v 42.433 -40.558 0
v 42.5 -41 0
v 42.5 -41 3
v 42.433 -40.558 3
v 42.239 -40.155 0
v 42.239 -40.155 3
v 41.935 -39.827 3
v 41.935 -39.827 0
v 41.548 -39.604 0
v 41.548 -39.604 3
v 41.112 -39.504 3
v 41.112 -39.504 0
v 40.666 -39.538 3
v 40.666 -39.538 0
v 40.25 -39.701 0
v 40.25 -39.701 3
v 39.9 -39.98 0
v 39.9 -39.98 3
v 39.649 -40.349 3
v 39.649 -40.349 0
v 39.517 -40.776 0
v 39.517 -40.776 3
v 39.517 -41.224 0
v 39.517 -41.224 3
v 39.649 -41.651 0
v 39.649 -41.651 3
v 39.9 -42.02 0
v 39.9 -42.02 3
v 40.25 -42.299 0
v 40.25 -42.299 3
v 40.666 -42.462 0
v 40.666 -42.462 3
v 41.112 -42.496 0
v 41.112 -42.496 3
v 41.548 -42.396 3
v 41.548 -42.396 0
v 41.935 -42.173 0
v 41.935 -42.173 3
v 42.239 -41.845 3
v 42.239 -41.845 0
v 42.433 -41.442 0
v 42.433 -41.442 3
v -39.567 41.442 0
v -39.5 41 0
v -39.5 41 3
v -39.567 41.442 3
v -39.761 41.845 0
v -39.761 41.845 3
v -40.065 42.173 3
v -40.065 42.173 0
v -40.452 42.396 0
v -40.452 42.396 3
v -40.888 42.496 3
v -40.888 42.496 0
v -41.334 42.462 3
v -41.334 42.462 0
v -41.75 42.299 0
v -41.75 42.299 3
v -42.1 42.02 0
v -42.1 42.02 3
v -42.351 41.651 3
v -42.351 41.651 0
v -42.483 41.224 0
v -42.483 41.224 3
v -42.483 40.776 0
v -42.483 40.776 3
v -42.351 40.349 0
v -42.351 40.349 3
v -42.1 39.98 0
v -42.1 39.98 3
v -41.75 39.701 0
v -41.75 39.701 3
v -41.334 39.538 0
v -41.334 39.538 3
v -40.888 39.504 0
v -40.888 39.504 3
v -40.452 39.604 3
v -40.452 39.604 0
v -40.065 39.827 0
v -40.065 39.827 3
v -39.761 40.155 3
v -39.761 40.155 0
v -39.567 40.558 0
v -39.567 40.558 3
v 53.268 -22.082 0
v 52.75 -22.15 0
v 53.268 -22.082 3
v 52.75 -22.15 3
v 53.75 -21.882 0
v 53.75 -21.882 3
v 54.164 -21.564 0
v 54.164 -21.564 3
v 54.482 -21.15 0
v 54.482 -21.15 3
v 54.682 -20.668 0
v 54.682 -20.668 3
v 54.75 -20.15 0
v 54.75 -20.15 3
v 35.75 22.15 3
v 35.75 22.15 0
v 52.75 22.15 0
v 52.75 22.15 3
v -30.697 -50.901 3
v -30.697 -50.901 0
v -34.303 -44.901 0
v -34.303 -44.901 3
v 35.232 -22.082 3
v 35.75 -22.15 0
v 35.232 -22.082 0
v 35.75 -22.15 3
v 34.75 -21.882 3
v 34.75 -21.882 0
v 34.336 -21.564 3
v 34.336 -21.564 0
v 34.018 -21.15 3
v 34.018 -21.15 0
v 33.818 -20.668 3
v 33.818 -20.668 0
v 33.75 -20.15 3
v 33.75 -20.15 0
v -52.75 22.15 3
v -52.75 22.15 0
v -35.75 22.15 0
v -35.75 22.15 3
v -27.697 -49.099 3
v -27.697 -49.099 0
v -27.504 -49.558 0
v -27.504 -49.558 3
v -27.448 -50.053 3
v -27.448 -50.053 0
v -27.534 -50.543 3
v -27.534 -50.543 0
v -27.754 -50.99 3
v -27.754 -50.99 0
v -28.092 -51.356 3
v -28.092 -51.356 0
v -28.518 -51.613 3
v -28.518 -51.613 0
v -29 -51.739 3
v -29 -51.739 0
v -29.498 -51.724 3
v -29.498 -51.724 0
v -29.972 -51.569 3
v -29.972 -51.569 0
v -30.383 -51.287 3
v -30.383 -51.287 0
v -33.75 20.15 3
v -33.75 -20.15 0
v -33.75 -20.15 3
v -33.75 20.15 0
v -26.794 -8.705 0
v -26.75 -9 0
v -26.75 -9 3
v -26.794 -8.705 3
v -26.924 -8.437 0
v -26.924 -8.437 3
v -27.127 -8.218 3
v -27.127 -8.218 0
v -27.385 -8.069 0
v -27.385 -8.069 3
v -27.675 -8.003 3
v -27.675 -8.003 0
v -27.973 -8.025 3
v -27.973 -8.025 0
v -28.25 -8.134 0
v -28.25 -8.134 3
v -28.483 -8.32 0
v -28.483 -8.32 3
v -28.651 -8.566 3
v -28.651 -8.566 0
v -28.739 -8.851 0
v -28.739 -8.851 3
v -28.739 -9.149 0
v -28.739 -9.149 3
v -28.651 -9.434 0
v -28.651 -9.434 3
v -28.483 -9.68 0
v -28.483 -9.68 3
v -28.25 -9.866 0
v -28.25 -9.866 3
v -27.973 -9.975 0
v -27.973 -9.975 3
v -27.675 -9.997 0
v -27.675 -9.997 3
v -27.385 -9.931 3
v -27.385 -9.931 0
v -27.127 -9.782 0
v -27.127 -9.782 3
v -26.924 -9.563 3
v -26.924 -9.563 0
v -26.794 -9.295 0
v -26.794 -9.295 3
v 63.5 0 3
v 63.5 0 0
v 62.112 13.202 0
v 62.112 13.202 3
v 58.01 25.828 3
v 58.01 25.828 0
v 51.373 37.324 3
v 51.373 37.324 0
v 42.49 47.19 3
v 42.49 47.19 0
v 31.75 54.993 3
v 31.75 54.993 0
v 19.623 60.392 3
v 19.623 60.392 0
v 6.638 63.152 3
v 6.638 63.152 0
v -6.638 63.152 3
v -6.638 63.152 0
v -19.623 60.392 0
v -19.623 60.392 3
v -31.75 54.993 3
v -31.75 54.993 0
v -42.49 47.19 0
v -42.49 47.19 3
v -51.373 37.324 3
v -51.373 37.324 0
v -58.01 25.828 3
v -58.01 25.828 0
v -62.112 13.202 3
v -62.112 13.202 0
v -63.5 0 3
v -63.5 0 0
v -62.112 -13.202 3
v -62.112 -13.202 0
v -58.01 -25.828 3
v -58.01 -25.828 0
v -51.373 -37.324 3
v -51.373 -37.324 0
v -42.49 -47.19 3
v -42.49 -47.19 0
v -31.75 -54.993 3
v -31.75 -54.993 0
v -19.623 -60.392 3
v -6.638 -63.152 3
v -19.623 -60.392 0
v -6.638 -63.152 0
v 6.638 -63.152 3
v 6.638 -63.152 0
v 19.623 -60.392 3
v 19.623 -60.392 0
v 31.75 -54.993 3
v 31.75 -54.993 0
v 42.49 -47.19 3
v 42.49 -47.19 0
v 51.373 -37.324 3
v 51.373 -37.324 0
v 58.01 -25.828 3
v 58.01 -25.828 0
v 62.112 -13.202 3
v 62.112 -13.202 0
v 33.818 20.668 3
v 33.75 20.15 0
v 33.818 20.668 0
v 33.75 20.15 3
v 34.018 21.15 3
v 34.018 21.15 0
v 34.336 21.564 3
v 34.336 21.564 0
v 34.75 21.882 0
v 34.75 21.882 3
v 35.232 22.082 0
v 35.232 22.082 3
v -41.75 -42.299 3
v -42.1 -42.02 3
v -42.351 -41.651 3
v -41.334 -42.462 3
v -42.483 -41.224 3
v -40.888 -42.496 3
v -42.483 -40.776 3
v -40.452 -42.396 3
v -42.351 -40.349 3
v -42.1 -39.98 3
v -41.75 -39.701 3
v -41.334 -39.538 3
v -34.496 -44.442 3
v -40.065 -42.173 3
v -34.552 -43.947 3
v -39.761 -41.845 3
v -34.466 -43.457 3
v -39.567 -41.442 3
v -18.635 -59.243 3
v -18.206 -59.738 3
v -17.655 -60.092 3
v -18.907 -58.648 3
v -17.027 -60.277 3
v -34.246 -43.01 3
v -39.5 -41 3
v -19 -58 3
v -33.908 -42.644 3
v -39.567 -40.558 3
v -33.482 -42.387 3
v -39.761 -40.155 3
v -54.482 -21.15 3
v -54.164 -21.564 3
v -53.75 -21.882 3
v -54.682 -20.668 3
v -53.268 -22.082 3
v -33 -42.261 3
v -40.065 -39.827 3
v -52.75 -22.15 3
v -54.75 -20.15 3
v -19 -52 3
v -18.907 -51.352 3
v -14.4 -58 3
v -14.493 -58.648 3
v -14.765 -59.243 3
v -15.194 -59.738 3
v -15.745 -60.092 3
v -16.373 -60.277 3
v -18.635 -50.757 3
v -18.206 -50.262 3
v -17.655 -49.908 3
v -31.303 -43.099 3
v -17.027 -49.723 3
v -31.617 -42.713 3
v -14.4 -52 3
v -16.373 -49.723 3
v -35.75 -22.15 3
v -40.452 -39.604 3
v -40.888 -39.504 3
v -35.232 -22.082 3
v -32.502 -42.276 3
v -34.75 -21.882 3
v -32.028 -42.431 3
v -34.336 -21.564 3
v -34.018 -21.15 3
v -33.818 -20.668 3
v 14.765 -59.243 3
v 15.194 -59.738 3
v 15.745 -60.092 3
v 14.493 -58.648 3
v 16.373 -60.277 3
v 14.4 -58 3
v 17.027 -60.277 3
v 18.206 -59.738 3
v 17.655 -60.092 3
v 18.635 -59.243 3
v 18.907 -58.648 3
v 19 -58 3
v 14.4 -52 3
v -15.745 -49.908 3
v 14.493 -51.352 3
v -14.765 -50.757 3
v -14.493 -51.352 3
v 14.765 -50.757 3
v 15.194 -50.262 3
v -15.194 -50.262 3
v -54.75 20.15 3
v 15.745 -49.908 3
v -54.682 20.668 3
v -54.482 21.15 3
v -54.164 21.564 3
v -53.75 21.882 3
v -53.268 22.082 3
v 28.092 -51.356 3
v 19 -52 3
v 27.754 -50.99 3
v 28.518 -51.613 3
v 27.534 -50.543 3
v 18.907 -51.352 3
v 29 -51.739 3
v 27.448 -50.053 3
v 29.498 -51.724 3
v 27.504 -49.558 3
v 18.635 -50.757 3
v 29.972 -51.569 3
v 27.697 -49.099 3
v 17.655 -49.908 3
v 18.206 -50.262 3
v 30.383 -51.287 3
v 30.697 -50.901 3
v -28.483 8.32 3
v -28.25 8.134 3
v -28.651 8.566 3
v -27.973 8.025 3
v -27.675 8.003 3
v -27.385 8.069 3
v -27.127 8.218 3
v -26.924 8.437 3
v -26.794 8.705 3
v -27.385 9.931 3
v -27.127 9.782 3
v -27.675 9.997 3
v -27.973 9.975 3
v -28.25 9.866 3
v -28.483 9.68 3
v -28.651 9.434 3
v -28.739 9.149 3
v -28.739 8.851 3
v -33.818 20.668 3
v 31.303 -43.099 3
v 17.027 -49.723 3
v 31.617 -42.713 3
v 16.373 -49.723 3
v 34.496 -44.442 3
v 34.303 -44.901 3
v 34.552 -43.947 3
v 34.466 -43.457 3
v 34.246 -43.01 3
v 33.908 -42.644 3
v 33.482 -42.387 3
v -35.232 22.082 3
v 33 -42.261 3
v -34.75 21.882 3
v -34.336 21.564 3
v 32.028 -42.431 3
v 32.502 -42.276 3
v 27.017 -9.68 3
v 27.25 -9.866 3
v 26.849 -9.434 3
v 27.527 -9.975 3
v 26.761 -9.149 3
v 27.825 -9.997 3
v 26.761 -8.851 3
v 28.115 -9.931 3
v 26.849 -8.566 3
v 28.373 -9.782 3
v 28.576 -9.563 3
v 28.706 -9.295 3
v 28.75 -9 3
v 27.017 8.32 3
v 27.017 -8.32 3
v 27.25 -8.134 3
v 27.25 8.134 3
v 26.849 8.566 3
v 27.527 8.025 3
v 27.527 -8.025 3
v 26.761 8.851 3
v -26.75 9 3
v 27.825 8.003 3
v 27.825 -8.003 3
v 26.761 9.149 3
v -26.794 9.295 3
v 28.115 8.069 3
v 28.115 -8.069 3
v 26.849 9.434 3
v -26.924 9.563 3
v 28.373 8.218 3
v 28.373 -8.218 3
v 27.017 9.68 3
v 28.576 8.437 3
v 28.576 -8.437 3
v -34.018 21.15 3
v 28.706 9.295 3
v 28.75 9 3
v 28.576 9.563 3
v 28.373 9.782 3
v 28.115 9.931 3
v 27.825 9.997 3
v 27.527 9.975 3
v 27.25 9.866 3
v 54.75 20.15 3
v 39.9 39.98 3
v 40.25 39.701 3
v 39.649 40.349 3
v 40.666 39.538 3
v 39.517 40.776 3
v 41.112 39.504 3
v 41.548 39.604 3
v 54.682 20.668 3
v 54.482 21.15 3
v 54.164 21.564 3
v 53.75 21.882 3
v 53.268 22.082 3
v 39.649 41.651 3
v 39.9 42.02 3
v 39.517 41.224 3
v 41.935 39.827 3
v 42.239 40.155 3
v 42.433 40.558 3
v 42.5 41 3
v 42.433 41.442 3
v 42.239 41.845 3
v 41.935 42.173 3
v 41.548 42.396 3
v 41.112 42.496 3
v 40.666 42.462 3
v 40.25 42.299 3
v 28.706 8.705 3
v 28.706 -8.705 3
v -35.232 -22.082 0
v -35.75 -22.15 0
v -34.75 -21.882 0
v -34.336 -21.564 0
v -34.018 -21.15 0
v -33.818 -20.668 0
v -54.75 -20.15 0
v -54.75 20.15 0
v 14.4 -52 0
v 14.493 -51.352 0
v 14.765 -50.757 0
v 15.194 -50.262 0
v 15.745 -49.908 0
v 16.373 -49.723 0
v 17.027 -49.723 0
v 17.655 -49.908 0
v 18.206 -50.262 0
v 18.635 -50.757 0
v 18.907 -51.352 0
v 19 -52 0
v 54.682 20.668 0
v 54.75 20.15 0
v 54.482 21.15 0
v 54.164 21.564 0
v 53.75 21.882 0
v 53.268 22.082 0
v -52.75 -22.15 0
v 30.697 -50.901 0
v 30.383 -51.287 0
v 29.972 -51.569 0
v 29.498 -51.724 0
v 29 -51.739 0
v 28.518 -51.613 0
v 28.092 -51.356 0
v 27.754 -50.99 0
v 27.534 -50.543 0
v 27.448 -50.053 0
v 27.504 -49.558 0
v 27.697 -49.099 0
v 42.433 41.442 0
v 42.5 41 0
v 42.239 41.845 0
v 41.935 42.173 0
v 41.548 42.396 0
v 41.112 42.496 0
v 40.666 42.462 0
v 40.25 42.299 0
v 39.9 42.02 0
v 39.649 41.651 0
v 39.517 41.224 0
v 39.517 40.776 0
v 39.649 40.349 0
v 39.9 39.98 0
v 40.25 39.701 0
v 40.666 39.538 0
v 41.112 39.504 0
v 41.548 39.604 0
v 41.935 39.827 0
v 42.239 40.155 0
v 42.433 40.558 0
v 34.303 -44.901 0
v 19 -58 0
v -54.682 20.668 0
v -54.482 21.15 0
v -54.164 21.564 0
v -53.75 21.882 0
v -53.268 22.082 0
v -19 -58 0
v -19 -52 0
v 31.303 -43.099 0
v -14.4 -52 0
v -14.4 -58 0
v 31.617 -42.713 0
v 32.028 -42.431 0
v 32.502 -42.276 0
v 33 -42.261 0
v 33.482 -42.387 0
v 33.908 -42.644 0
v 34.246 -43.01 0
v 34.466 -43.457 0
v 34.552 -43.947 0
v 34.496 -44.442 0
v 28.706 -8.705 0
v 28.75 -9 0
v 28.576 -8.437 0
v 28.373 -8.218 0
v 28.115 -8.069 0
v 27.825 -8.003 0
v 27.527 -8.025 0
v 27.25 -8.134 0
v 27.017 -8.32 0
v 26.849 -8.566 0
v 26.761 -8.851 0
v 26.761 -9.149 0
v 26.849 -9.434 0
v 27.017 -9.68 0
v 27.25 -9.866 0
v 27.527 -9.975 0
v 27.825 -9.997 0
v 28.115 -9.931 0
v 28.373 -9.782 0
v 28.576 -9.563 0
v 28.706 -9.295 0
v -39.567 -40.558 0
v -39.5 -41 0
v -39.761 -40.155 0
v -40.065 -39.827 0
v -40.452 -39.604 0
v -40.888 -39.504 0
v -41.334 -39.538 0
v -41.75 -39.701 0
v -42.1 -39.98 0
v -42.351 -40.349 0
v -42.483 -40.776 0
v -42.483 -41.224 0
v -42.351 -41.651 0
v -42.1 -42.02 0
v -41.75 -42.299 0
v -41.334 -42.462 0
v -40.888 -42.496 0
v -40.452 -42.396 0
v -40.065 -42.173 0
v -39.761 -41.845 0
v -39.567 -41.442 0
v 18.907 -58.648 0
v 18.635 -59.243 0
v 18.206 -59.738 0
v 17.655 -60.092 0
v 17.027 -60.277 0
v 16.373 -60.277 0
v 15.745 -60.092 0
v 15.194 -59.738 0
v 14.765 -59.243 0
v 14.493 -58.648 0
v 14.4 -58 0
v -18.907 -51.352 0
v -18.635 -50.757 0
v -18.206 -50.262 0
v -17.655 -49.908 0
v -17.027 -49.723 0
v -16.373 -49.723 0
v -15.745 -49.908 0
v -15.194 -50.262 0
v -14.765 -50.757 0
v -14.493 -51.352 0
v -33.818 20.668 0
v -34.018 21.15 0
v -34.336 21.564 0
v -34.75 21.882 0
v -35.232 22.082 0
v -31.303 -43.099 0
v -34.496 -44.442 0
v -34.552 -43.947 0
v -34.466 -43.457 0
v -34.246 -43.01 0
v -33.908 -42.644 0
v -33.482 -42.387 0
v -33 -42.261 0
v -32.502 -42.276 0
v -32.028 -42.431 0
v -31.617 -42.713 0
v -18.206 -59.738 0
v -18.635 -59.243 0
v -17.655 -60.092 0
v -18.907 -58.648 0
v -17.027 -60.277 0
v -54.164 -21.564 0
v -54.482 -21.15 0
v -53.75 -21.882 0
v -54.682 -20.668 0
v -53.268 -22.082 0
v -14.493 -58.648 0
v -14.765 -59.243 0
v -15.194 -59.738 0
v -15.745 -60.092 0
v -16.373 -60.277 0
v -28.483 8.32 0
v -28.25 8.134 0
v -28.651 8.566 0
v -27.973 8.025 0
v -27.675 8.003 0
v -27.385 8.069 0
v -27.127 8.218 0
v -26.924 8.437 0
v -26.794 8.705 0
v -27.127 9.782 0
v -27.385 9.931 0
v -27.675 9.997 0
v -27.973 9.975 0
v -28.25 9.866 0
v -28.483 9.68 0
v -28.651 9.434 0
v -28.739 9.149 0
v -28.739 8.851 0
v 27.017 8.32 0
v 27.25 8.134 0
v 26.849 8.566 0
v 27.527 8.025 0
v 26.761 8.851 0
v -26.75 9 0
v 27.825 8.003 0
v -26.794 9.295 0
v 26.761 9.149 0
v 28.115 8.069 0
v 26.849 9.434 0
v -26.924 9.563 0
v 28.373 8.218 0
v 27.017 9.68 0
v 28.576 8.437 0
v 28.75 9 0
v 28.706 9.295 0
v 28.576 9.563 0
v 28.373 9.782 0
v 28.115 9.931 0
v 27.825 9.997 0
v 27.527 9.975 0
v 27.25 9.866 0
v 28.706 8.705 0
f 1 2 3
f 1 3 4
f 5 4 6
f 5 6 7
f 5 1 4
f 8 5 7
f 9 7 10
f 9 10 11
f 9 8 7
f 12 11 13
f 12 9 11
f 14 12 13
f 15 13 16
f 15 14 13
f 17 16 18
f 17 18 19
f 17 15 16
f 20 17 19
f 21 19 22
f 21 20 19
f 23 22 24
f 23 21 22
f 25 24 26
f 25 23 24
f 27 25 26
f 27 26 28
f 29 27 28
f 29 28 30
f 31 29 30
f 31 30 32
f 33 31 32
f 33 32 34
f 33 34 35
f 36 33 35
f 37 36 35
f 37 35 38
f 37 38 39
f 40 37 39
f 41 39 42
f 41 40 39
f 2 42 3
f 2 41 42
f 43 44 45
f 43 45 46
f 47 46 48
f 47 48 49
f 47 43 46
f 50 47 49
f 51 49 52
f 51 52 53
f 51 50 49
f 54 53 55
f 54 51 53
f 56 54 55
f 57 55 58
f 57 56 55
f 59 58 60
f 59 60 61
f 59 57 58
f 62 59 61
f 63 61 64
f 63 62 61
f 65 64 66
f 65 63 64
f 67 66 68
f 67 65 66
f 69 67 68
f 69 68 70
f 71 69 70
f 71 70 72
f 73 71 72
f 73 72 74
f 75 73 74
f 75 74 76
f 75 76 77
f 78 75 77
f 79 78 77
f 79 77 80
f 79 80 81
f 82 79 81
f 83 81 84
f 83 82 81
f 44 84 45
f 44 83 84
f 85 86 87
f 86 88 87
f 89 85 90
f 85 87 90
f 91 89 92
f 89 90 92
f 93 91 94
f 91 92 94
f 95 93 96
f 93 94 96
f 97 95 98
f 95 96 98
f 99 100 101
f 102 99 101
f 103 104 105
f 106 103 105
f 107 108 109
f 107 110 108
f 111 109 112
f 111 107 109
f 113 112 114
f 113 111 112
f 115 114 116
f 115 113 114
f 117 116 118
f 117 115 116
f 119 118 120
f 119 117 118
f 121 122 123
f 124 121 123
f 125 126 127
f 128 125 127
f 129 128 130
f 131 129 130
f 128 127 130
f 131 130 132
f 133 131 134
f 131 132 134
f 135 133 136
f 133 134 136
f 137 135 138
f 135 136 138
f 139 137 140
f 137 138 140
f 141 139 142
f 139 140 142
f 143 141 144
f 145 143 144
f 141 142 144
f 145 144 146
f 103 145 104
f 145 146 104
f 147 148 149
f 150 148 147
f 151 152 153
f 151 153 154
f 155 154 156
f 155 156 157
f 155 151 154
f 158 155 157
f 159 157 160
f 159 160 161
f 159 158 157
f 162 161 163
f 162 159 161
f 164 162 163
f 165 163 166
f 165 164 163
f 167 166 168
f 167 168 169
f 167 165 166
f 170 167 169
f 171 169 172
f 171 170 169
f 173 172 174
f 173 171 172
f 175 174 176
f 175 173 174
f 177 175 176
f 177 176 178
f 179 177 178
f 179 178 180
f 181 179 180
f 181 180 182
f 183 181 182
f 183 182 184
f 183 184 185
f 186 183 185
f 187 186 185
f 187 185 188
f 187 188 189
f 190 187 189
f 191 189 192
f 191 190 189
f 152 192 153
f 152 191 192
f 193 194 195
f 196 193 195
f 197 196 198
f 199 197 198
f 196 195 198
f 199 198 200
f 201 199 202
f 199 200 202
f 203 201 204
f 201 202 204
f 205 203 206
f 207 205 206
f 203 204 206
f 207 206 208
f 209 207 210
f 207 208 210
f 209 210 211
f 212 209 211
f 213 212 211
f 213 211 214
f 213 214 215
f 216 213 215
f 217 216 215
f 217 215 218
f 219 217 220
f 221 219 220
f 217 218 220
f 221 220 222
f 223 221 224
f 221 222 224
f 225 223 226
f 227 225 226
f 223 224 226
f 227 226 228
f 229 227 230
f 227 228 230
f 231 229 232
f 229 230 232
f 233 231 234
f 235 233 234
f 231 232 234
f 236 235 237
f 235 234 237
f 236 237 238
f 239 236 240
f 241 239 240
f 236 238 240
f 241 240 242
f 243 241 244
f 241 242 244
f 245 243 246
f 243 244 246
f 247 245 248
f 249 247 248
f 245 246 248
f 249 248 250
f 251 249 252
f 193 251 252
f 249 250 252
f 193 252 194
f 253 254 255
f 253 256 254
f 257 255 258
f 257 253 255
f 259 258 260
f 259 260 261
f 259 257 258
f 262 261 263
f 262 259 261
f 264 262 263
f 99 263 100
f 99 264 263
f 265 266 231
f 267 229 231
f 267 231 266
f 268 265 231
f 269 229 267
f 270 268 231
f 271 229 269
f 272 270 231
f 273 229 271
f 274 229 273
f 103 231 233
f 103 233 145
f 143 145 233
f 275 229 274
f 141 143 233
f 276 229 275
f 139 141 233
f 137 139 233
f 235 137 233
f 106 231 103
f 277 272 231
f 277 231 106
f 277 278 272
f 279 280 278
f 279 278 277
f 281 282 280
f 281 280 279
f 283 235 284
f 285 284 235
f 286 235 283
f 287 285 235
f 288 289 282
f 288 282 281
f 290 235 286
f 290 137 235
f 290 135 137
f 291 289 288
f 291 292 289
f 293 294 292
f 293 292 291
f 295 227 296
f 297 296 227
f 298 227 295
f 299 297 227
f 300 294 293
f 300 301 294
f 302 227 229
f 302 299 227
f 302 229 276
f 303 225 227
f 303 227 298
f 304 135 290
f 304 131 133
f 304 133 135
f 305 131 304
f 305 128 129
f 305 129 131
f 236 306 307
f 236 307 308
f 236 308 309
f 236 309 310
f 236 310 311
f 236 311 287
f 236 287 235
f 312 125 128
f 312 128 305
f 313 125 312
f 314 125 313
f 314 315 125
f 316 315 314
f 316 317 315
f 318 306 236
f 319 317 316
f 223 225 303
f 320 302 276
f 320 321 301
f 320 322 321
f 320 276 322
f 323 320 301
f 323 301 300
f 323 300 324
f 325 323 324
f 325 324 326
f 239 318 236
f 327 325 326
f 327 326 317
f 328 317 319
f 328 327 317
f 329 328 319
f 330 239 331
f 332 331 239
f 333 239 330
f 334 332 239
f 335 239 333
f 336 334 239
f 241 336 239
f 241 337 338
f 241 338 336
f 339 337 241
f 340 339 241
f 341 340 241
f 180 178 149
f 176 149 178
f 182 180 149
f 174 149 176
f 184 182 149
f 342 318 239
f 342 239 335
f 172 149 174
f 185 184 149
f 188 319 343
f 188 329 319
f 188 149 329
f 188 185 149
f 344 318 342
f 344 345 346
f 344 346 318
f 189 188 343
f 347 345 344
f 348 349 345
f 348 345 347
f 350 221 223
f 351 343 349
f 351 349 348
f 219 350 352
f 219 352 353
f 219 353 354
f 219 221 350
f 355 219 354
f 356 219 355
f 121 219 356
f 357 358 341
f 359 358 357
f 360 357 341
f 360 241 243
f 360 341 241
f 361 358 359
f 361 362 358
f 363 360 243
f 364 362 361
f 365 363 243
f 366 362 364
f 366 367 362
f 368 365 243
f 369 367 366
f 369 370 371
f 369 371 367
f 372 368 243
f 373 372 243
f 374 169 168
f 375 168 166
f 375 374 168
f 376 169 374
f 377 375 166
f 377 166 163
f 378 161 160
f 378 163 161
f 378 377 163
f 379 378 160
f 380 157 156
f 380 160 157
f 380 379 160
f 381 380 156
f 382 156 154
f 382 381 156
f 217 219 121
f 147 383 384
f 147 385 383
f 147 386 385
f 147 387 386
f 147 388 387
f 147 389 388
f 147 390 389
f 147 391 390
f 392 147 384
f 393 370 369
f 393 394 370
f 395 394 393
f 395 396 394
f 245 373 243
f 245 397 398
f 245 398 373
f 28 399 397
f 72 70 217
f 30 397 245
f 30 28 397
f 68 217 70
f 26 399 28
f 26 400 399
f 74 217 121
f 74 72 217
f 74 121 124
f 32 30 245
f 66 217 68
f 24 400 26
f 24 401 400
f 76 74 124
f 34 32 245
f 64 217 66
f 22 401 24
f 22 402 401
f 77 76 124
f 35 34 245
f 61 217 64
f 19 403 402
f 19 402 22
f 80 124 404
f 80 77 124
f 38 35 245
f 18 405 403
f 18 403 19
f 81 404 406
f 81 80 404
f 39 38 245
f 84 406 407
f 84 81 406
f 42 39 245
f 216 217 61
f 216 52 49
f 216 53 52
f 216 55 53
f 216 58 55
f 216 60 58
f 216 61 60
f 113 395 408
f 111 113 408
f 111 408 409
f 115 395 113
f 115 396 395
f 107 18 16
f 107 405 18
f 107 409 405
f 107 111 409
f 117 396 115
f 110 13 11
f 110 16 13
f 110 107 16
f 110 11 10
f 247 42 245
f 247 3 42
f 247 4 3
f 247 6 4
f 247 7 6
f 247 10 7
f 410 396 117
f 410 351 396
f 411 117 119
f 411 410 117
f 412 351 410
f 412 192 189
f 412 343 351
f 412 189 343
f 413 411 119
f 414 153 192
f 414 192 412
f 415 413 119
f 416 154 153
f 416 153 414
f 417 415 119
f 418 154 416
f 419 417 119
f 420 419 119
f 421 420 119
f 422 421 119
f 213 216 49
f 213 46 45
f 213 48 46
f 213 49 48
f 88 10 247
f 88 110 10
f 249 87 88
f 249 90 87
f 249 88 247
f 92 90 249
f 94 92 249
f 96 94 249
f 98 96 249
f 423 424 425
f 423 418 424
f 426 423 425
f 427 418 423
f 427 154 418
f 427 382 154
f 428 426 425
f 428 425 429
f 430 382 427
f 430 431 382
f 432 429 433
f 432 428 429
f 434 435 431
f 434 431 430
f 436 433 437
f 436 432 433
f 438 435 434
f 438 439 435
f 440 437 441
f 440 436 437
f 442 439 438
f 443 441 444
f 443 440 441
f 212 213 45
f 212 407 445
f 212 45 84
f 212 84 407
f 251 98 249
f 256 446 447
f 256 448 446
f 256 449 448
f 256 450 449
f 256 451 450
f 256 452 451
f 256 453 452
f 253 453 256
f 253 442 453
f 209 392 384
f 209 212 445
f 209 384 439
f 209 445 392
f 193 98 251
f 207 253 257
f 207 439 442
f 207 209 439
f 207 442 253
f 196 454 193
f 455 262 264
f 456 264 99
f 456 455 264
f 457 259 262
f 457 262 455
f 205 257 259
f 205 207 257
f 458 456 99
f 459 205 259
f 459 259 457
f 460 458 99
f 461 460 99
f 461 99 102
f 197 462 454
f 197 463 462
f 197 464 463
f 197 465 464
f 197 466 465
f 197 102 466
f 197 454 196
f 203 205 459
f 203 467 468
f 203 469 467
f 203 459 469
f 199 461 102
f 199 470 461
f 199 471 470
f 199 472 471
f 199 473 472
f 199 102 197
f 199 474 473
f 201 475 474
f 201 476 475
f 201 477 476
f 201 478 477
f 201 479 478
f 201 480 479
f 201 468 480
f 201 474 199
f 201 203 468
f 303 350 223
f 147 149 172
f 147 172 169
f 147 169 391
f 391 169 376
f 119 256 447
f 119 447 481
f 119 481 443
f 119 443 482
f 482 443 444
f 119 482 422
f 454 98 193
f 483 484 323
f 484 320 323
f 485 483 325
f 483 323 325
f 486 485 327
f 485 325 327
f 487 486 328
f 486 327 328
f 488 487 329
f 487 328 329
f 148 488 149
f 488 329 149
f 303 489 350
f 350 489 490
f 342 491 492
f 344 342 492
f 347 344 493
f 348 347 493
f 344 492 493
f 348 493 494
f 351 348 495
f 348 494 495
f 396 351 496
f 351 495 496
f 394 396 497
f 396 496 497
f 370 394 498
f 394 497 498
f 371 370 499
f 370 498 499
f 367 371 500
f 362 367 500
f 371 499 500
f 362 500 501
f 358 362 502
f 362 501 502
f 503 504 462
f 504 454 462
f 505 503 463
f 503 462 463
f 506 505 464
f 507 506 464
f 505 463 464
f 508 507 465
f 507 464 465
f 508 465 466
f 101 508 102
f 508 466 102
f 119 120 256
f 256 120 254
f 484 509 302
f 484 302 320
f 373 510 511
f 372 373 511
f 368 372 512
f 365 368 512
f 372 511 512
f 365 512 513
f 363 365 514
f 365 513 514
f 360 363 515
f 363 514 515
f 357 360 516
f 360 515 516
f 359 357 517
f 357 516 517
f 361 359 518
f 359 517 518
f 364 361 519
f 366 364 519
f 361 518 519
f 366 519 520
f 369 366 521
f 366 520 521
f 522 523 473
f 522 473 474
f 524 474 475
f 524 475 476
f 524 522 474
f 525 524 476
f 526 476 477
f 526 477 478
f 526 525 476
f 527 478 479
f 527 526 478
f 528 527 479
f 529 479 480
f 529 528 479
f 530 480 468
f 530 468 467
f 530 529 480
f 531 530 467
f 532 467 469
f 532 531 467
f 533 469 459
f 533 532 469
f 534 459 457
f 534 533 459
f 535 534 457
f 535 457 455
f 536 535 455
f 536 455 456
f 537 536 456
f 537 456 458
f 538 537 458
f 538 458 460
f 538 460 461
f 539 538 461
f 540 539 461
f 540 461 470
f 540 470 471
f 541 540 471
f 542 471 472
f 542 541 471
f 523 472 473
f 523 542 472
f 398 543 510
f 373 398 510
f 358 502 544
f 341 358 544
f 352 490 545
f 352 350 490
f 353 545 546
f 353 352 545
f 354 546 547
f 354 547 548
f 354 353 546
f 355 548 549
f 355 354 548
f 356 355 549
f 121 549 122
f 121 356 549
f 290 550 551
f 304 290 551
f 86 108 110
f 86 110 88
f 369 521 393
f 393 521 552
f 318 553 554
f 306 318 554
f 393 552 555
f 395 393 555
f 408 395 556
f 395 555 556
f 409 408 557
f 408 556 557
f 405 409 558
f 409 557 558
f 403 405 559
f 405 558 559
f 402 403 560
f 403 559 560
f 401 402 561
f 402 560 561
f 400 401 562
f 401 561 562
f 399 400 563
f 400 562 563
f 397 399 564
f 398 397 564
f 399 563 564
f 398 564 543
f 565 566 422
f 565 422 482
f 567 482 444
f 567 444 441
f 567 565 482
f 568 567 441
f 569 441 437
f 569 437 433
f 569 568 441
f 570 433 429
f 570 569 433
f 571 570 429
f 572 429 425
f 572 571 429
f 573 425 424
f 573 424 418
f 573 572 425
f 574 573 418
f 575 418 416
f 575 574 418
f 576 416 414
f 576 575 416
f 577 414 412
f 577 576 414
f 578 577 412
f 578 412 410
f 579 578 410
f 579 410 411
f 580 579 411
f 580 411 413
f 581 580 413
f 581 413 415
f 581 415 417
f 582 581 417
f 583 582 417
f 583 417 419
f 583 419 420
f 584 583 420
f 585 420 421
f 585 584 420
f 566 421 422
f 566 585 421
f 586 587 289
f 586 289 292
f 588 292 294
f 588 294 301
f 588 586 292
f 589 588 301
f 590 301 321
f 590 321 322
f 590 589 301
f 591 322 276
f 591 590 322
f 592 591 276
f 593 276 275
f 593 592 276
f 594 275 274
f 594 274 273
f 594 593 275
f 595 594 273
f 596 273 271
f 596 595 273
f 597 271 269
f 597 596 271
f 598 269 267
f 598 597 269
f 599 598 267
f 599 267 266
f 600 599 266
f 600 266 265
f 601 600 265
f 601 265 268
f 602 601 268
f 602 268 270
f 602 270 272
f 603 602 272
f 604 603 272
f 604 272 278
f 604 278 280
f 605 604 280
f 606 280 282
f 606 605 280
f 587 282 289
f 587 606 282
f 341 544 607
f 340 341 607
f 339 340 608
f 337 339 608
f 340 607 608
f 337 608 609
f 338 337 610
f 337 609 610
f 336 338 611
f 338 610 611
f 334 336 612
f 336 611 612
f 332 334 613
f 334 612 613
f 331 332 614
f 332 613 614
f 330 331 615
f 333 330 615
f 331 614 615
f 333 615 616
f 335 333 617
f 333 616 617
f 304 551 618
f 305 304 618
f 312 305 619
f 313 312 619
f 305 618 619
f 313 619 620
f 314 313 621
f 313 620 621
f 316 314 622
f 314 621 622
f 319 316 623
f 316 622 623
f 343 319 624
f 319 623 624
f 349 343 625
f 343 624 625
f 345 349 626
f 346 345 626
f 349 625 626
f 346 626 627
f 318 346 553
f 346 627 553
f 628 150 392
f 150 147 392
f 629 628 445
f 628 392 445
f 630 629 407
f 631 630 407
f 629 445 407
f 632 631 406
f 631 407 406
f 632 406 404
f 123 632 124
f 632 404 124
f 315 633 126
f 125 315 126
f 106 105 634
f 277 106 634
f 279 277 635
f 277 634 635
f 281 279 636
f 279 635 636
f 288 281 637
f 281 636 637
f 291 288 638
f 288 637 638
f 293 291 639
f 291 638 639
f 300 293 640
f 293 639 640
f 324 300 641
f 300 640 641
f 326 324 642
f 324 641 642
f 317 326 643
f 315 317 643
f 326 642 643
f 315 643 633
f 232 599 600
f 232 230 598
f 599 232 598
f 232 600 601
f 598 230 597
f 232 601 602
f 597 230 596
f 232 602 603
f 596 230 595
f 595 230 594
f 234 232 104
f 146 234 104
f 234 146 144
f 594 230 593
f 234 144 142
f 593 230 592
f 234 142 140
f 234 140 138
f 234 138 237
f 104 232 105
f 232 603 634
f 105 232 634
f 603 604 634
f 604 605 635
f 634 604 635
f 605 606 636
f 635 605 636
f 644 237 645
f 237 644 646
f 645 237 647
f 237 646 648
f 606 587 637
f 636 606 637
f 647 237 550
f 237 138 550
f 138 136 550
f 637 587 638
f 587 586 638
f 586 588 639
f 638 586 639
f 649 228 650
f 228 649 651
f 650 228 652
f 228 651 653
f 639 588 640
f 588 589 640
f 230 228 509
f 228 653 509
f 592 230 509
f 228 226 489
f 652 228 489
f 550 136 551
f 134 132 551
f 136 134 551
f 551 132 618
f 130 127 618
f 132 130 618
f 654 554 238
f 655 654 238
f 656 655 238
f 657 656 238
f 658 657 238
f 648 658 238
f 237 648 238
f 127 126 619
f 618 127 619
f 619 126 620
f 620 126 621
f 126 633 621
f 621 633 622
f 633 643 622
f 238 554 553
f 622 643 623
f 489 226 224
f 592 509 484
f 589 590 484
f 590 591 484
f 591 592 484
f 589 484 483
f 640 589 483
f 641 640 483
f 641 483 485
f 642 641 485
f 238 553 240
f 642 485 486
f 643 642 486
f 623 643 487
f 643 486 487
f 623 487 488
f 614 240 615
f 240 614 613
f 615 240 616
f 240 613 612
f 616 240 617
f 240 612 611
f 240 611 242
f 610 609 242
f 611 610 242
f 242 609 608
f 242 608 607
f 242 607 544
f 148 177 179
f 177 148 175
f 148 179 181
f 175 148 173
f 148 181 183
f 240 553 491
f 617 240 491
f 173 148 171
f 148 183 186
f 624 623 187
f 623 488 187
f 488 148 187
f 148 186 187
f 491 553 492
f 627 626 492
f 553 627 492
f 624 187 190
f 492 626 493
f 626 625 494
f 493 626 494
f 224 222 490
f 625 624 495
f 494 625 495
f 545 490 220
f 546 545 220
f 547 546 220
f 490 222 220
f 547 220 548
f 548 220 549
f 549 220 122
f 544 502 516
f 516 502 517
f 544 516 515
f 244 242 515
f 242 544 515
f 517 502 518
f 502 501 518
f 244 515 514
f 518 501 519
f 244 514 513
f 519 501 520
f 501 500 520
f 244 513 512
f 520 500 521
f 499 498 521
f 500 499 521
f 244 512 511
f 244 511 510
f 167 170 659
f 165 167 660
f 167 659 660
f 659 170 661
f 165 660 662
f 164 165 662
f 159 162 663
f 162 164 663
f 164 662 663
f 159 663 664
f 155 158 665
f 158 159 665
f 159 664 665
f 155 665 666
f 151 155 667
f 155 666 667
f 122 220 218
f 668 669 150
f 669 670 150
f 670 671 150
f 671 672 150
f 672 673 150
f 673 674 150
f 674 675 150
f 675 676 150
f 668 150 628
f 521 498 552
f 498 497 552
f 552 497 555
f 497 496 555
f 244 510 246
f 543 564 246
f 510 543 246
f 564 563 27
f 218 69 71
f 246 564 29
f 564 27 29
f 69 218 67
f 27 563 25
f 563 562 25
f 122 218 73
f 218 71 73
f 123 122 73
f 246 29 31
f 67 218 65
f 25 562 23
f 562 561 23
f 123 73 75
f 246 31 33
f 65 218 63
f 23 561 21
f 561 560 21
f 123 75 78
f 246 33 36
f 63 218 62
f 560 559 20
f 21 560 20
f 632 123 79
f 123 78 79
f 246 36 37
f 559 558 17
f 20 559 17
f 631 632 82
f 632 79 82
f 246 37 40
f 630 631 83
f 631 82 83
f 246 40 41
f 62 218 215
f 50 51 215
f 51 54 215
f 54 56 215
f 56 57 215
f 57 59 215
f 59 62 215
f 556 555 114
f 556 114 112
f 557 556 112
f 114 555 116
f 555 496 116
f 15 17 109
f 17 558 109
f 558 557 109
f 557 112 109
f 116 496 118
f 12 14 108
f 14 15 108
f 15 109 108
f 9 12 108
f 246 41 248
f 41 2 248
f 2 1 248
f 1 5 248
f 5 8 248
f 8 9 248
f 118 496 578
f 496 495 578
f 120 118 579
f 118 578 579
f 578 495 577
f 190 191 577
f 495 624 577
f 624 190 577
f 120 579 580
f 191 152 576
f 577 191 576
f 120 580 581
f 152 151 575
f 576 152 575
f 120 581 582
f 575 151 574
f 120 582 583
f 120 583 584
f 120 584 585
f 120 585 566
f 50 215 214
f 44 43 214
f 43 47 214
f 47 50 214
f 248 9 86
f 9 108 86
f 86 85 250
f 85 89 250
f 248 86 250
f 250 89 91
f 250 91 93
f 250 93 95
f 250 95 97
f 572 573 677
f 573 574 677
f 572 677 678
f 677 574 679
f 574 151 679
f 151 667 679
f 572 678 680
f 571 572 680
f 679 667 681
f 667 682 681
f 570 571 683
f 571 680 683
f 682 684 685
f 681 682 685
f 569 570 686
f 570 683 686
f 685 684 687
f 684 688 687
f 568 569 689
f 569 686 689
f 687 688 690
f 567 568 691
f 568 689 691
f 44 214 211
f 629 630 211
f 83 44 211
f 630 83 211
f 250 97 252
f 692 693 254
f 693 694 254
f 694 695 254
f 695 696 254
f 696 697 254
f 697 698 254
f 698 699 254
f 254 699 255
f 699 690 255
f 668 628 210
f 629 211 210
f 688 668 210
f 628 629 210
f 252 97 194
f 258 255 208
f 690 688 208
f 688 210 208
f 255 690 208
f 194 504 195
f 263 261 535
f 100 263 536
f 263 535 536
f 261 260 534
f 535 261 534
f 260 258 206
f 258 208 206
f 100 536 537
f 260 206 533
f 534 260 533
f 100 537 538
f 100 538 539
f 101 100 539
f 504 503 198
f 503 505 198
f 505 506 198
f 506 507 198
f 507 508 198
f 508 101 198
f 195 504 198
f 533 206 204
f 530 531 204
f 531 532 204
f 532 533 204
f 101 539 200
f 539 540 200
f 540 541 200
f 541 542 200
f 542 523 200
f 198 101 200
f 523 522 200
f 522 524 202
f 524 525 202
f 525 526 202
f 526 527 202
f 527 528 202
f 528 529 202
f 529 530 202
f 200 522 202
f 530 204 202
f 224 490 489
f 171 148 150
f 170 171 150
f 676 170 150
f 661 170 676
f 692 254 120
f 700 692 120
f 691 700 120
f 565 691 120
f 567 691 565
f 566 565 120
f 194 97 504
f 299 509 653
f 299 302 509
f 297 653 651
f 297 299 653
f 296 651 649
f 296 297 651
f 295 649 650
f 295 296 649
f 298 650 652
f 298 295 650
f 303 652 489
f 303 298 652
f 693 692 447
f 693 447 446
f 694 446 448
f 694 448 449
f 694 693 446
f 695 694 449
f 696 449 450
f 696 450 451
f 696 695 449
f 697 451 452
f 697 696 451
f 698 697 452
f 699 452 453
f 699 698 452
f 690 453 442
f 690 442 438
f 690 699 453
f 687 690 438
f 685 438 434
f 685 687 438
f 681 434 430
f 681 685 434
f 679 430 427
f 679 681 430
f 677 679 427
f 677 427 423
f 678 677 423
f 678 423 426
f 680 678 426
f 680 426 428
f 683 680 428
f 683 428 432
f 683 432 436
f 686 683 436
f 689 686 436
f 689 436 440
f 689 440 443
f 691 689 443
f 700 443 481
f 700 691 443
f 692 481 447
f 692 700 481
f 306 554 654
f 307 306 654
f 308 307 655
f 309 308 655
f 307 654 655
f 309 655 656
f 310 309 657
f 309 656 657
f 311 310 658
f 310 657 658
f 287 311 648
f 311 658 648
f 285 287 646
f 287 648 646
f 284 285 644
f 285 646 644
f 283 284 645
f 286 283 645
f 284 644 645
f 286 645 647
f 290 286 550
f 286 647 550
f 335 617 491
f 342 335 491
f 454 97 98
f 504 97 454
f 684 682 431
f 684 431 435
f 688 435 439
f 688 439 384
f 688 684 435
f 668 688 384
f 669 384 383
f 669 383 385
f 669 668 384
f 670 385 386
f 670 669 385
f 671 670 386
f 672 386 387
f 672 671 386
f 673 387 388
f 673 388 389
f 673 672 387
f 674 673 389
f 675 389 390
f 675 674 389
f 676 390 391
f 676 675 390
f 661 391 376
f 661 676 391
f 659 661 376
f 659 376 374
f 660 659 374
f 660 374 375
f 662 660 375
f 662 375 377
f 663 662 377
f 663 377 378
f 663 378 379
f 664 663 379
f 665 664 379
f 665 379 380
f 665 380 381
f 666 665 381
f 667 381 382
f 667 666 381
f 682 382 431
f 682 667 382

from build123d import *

# Parameters (mm, degrees)
BOSS_EXTRUDE1_OUTLINE_R   = 63.5
BOSS_EXTRUDE1_OUTLINE_R_2 = 1.5
BOSS_EXTRUDE1_OUTLINE_R_3 = 1
BOSS_EXTRUDE1_OUTLINE_W   = 21
BOSS_EXTRUDE1_OUTLINE_H   = 44.3
BOSS_EXTRUDE1_DEPTH       = 3
FILLET1_R                 = 2


# Read off the part's stored shape, not the designer's step: Boss-Extrude1
with BuildPart() as part:
    # Boss-Extrude1 outline → Boss-Extrude1 (new body)
    with BuildSketch(Plane.XY):
        Circle(BOSS_EXTRUDE1_OUTLINE_R)
        with Locations((-41, -41)):
            Circle(BOSS_EXTRUDE1_OUTLINE_R_2, mode=Mode.SUBTRACT)
        with BuildLine():
            Line((-19, -58), (-19, -52))
            ThreePointArc((-19, -52), (-16.7, -49.7), (-14.4, -52))
            Line((-14.4, -52), (-14.4, -58))
            ThreePointArc((-14.4, -58), (-16.7, -60.3), (-19, -58))
        make_face(mode=Mode.SUBTRACT)
        with BuildLine():
            Line((-30.697224362, -50.901387819), (-34.302775638, -44.901387819))
            ThreePointArc((-34.302775638, -44.901387819), (-33.704163457, -42.5), (-31.302775638, -43.098612181))
            Line((-31.302775638, -43.098612181), (-27.697224362, -49.098612181))
            ThreePointArc((-27.697224362, -49.098612181), (-28.295836543, -51.5), (-30.697224362, -50.901387819))
        make_face(mode=Mode.SUBTRACT)
        with Locations((-27.75, -9)):
            Circle(BOSS_EXTRUDE1_OUTLINE_R_3, mode=Mode.SUBTRACT)
        with BuildLine():
            Line((14.4, -58), (14.4, -52))
            ThreePointArc((14.4, -52), (16.7, -49.7), (19, -52))
            Line((19, -52), (19, -58))
            ThreePointArc((19, -58), (16.7, -60.3), (14.4, -58))
        make_face(mode=Mode.SUBTRACT)
        with BuildLine():
            Line((34.302775638, -44.901387819), (30.697224362, -50.901387819))
            ThreePointArc((30.697224362, -50.901387819), (28.295836543, -51.5), (27.697224362, -49.098612181))
            Line((27.697224362, -49.098612181), (31.302775638, -43.098612181))
            ThreePointArc((31.302775638, -43.098612181), (33.704163457, -42.5), (34.302775638, -44.901387819))
        make_face(mode=Mode.SUBTRACT)
        with Locations((41, -41)):
            Circle(BOSS_EXTRUDE1_OUTLINE_R_2, mode=Mode.SUBTRACT)
        with Locations((27.75, -9)):
            Circle(BOSS_EXTRUDE1_OUTLINE_R_3, mode=Mode.SUBTRACT)
        with Locations((-44.25, 0)):
            Rectangle(BOSS_EXTRUDE1_OUTLINE_W, BOSS_EXTRUDE1_OUTLINE_H, mode=Mode.SUBTRACT)
        with Locations((-27.75, 9)):
            Circle(BOSS_EXTRUDE1_OUTLINE_R_3, mode=Mode.SUBTRACT)
        with Locations((-41, 41)):
            Circle(BOSS_EXTRUDE1_OUTLINE_R_2, mode=Mode.SUBTRACT)
        with Locations((27.75, 9)):
            Circle(BOSS_EXTRUDE1_OUTLINE_R_3, mode=Mode.SUBTRACT)
        with Locations((44.25, 0)):
            Rectangle(BOSS_EXTRUDE1_OUTLINE_W, BOSS_EXTRUDE1_OUTLINE_H, mode=Mode.SUBTRACT)
        with Locations((41, 41)):
            Circle(BOSS_EXTRUDE1_OUTLINE_R_2, mode=Mode.SUBTRACT)
    extrude(amount=BOSS_EXTRUDE1_DEPTH)

    # Fillet1
    fillet1_edges = [part.edges().sort_by_distance(p)[0] for p in [
        (-54.75, 22.15, 1.5),
        (-54.75, -22.15, 1.5),
        (-33.75, -22.15, 1.5),
        (-33.75, 22.15, 1.5),
        (33.75, 22.15, 1.5),
        (33.75, -22.15, 1.5),
        (54.75, -22.15, 1.5),
        (54.75, 22.15, 1.5),
    ]]
    fillet(fillet1_edges, radius=FILLET1_R)


solid = part.part
